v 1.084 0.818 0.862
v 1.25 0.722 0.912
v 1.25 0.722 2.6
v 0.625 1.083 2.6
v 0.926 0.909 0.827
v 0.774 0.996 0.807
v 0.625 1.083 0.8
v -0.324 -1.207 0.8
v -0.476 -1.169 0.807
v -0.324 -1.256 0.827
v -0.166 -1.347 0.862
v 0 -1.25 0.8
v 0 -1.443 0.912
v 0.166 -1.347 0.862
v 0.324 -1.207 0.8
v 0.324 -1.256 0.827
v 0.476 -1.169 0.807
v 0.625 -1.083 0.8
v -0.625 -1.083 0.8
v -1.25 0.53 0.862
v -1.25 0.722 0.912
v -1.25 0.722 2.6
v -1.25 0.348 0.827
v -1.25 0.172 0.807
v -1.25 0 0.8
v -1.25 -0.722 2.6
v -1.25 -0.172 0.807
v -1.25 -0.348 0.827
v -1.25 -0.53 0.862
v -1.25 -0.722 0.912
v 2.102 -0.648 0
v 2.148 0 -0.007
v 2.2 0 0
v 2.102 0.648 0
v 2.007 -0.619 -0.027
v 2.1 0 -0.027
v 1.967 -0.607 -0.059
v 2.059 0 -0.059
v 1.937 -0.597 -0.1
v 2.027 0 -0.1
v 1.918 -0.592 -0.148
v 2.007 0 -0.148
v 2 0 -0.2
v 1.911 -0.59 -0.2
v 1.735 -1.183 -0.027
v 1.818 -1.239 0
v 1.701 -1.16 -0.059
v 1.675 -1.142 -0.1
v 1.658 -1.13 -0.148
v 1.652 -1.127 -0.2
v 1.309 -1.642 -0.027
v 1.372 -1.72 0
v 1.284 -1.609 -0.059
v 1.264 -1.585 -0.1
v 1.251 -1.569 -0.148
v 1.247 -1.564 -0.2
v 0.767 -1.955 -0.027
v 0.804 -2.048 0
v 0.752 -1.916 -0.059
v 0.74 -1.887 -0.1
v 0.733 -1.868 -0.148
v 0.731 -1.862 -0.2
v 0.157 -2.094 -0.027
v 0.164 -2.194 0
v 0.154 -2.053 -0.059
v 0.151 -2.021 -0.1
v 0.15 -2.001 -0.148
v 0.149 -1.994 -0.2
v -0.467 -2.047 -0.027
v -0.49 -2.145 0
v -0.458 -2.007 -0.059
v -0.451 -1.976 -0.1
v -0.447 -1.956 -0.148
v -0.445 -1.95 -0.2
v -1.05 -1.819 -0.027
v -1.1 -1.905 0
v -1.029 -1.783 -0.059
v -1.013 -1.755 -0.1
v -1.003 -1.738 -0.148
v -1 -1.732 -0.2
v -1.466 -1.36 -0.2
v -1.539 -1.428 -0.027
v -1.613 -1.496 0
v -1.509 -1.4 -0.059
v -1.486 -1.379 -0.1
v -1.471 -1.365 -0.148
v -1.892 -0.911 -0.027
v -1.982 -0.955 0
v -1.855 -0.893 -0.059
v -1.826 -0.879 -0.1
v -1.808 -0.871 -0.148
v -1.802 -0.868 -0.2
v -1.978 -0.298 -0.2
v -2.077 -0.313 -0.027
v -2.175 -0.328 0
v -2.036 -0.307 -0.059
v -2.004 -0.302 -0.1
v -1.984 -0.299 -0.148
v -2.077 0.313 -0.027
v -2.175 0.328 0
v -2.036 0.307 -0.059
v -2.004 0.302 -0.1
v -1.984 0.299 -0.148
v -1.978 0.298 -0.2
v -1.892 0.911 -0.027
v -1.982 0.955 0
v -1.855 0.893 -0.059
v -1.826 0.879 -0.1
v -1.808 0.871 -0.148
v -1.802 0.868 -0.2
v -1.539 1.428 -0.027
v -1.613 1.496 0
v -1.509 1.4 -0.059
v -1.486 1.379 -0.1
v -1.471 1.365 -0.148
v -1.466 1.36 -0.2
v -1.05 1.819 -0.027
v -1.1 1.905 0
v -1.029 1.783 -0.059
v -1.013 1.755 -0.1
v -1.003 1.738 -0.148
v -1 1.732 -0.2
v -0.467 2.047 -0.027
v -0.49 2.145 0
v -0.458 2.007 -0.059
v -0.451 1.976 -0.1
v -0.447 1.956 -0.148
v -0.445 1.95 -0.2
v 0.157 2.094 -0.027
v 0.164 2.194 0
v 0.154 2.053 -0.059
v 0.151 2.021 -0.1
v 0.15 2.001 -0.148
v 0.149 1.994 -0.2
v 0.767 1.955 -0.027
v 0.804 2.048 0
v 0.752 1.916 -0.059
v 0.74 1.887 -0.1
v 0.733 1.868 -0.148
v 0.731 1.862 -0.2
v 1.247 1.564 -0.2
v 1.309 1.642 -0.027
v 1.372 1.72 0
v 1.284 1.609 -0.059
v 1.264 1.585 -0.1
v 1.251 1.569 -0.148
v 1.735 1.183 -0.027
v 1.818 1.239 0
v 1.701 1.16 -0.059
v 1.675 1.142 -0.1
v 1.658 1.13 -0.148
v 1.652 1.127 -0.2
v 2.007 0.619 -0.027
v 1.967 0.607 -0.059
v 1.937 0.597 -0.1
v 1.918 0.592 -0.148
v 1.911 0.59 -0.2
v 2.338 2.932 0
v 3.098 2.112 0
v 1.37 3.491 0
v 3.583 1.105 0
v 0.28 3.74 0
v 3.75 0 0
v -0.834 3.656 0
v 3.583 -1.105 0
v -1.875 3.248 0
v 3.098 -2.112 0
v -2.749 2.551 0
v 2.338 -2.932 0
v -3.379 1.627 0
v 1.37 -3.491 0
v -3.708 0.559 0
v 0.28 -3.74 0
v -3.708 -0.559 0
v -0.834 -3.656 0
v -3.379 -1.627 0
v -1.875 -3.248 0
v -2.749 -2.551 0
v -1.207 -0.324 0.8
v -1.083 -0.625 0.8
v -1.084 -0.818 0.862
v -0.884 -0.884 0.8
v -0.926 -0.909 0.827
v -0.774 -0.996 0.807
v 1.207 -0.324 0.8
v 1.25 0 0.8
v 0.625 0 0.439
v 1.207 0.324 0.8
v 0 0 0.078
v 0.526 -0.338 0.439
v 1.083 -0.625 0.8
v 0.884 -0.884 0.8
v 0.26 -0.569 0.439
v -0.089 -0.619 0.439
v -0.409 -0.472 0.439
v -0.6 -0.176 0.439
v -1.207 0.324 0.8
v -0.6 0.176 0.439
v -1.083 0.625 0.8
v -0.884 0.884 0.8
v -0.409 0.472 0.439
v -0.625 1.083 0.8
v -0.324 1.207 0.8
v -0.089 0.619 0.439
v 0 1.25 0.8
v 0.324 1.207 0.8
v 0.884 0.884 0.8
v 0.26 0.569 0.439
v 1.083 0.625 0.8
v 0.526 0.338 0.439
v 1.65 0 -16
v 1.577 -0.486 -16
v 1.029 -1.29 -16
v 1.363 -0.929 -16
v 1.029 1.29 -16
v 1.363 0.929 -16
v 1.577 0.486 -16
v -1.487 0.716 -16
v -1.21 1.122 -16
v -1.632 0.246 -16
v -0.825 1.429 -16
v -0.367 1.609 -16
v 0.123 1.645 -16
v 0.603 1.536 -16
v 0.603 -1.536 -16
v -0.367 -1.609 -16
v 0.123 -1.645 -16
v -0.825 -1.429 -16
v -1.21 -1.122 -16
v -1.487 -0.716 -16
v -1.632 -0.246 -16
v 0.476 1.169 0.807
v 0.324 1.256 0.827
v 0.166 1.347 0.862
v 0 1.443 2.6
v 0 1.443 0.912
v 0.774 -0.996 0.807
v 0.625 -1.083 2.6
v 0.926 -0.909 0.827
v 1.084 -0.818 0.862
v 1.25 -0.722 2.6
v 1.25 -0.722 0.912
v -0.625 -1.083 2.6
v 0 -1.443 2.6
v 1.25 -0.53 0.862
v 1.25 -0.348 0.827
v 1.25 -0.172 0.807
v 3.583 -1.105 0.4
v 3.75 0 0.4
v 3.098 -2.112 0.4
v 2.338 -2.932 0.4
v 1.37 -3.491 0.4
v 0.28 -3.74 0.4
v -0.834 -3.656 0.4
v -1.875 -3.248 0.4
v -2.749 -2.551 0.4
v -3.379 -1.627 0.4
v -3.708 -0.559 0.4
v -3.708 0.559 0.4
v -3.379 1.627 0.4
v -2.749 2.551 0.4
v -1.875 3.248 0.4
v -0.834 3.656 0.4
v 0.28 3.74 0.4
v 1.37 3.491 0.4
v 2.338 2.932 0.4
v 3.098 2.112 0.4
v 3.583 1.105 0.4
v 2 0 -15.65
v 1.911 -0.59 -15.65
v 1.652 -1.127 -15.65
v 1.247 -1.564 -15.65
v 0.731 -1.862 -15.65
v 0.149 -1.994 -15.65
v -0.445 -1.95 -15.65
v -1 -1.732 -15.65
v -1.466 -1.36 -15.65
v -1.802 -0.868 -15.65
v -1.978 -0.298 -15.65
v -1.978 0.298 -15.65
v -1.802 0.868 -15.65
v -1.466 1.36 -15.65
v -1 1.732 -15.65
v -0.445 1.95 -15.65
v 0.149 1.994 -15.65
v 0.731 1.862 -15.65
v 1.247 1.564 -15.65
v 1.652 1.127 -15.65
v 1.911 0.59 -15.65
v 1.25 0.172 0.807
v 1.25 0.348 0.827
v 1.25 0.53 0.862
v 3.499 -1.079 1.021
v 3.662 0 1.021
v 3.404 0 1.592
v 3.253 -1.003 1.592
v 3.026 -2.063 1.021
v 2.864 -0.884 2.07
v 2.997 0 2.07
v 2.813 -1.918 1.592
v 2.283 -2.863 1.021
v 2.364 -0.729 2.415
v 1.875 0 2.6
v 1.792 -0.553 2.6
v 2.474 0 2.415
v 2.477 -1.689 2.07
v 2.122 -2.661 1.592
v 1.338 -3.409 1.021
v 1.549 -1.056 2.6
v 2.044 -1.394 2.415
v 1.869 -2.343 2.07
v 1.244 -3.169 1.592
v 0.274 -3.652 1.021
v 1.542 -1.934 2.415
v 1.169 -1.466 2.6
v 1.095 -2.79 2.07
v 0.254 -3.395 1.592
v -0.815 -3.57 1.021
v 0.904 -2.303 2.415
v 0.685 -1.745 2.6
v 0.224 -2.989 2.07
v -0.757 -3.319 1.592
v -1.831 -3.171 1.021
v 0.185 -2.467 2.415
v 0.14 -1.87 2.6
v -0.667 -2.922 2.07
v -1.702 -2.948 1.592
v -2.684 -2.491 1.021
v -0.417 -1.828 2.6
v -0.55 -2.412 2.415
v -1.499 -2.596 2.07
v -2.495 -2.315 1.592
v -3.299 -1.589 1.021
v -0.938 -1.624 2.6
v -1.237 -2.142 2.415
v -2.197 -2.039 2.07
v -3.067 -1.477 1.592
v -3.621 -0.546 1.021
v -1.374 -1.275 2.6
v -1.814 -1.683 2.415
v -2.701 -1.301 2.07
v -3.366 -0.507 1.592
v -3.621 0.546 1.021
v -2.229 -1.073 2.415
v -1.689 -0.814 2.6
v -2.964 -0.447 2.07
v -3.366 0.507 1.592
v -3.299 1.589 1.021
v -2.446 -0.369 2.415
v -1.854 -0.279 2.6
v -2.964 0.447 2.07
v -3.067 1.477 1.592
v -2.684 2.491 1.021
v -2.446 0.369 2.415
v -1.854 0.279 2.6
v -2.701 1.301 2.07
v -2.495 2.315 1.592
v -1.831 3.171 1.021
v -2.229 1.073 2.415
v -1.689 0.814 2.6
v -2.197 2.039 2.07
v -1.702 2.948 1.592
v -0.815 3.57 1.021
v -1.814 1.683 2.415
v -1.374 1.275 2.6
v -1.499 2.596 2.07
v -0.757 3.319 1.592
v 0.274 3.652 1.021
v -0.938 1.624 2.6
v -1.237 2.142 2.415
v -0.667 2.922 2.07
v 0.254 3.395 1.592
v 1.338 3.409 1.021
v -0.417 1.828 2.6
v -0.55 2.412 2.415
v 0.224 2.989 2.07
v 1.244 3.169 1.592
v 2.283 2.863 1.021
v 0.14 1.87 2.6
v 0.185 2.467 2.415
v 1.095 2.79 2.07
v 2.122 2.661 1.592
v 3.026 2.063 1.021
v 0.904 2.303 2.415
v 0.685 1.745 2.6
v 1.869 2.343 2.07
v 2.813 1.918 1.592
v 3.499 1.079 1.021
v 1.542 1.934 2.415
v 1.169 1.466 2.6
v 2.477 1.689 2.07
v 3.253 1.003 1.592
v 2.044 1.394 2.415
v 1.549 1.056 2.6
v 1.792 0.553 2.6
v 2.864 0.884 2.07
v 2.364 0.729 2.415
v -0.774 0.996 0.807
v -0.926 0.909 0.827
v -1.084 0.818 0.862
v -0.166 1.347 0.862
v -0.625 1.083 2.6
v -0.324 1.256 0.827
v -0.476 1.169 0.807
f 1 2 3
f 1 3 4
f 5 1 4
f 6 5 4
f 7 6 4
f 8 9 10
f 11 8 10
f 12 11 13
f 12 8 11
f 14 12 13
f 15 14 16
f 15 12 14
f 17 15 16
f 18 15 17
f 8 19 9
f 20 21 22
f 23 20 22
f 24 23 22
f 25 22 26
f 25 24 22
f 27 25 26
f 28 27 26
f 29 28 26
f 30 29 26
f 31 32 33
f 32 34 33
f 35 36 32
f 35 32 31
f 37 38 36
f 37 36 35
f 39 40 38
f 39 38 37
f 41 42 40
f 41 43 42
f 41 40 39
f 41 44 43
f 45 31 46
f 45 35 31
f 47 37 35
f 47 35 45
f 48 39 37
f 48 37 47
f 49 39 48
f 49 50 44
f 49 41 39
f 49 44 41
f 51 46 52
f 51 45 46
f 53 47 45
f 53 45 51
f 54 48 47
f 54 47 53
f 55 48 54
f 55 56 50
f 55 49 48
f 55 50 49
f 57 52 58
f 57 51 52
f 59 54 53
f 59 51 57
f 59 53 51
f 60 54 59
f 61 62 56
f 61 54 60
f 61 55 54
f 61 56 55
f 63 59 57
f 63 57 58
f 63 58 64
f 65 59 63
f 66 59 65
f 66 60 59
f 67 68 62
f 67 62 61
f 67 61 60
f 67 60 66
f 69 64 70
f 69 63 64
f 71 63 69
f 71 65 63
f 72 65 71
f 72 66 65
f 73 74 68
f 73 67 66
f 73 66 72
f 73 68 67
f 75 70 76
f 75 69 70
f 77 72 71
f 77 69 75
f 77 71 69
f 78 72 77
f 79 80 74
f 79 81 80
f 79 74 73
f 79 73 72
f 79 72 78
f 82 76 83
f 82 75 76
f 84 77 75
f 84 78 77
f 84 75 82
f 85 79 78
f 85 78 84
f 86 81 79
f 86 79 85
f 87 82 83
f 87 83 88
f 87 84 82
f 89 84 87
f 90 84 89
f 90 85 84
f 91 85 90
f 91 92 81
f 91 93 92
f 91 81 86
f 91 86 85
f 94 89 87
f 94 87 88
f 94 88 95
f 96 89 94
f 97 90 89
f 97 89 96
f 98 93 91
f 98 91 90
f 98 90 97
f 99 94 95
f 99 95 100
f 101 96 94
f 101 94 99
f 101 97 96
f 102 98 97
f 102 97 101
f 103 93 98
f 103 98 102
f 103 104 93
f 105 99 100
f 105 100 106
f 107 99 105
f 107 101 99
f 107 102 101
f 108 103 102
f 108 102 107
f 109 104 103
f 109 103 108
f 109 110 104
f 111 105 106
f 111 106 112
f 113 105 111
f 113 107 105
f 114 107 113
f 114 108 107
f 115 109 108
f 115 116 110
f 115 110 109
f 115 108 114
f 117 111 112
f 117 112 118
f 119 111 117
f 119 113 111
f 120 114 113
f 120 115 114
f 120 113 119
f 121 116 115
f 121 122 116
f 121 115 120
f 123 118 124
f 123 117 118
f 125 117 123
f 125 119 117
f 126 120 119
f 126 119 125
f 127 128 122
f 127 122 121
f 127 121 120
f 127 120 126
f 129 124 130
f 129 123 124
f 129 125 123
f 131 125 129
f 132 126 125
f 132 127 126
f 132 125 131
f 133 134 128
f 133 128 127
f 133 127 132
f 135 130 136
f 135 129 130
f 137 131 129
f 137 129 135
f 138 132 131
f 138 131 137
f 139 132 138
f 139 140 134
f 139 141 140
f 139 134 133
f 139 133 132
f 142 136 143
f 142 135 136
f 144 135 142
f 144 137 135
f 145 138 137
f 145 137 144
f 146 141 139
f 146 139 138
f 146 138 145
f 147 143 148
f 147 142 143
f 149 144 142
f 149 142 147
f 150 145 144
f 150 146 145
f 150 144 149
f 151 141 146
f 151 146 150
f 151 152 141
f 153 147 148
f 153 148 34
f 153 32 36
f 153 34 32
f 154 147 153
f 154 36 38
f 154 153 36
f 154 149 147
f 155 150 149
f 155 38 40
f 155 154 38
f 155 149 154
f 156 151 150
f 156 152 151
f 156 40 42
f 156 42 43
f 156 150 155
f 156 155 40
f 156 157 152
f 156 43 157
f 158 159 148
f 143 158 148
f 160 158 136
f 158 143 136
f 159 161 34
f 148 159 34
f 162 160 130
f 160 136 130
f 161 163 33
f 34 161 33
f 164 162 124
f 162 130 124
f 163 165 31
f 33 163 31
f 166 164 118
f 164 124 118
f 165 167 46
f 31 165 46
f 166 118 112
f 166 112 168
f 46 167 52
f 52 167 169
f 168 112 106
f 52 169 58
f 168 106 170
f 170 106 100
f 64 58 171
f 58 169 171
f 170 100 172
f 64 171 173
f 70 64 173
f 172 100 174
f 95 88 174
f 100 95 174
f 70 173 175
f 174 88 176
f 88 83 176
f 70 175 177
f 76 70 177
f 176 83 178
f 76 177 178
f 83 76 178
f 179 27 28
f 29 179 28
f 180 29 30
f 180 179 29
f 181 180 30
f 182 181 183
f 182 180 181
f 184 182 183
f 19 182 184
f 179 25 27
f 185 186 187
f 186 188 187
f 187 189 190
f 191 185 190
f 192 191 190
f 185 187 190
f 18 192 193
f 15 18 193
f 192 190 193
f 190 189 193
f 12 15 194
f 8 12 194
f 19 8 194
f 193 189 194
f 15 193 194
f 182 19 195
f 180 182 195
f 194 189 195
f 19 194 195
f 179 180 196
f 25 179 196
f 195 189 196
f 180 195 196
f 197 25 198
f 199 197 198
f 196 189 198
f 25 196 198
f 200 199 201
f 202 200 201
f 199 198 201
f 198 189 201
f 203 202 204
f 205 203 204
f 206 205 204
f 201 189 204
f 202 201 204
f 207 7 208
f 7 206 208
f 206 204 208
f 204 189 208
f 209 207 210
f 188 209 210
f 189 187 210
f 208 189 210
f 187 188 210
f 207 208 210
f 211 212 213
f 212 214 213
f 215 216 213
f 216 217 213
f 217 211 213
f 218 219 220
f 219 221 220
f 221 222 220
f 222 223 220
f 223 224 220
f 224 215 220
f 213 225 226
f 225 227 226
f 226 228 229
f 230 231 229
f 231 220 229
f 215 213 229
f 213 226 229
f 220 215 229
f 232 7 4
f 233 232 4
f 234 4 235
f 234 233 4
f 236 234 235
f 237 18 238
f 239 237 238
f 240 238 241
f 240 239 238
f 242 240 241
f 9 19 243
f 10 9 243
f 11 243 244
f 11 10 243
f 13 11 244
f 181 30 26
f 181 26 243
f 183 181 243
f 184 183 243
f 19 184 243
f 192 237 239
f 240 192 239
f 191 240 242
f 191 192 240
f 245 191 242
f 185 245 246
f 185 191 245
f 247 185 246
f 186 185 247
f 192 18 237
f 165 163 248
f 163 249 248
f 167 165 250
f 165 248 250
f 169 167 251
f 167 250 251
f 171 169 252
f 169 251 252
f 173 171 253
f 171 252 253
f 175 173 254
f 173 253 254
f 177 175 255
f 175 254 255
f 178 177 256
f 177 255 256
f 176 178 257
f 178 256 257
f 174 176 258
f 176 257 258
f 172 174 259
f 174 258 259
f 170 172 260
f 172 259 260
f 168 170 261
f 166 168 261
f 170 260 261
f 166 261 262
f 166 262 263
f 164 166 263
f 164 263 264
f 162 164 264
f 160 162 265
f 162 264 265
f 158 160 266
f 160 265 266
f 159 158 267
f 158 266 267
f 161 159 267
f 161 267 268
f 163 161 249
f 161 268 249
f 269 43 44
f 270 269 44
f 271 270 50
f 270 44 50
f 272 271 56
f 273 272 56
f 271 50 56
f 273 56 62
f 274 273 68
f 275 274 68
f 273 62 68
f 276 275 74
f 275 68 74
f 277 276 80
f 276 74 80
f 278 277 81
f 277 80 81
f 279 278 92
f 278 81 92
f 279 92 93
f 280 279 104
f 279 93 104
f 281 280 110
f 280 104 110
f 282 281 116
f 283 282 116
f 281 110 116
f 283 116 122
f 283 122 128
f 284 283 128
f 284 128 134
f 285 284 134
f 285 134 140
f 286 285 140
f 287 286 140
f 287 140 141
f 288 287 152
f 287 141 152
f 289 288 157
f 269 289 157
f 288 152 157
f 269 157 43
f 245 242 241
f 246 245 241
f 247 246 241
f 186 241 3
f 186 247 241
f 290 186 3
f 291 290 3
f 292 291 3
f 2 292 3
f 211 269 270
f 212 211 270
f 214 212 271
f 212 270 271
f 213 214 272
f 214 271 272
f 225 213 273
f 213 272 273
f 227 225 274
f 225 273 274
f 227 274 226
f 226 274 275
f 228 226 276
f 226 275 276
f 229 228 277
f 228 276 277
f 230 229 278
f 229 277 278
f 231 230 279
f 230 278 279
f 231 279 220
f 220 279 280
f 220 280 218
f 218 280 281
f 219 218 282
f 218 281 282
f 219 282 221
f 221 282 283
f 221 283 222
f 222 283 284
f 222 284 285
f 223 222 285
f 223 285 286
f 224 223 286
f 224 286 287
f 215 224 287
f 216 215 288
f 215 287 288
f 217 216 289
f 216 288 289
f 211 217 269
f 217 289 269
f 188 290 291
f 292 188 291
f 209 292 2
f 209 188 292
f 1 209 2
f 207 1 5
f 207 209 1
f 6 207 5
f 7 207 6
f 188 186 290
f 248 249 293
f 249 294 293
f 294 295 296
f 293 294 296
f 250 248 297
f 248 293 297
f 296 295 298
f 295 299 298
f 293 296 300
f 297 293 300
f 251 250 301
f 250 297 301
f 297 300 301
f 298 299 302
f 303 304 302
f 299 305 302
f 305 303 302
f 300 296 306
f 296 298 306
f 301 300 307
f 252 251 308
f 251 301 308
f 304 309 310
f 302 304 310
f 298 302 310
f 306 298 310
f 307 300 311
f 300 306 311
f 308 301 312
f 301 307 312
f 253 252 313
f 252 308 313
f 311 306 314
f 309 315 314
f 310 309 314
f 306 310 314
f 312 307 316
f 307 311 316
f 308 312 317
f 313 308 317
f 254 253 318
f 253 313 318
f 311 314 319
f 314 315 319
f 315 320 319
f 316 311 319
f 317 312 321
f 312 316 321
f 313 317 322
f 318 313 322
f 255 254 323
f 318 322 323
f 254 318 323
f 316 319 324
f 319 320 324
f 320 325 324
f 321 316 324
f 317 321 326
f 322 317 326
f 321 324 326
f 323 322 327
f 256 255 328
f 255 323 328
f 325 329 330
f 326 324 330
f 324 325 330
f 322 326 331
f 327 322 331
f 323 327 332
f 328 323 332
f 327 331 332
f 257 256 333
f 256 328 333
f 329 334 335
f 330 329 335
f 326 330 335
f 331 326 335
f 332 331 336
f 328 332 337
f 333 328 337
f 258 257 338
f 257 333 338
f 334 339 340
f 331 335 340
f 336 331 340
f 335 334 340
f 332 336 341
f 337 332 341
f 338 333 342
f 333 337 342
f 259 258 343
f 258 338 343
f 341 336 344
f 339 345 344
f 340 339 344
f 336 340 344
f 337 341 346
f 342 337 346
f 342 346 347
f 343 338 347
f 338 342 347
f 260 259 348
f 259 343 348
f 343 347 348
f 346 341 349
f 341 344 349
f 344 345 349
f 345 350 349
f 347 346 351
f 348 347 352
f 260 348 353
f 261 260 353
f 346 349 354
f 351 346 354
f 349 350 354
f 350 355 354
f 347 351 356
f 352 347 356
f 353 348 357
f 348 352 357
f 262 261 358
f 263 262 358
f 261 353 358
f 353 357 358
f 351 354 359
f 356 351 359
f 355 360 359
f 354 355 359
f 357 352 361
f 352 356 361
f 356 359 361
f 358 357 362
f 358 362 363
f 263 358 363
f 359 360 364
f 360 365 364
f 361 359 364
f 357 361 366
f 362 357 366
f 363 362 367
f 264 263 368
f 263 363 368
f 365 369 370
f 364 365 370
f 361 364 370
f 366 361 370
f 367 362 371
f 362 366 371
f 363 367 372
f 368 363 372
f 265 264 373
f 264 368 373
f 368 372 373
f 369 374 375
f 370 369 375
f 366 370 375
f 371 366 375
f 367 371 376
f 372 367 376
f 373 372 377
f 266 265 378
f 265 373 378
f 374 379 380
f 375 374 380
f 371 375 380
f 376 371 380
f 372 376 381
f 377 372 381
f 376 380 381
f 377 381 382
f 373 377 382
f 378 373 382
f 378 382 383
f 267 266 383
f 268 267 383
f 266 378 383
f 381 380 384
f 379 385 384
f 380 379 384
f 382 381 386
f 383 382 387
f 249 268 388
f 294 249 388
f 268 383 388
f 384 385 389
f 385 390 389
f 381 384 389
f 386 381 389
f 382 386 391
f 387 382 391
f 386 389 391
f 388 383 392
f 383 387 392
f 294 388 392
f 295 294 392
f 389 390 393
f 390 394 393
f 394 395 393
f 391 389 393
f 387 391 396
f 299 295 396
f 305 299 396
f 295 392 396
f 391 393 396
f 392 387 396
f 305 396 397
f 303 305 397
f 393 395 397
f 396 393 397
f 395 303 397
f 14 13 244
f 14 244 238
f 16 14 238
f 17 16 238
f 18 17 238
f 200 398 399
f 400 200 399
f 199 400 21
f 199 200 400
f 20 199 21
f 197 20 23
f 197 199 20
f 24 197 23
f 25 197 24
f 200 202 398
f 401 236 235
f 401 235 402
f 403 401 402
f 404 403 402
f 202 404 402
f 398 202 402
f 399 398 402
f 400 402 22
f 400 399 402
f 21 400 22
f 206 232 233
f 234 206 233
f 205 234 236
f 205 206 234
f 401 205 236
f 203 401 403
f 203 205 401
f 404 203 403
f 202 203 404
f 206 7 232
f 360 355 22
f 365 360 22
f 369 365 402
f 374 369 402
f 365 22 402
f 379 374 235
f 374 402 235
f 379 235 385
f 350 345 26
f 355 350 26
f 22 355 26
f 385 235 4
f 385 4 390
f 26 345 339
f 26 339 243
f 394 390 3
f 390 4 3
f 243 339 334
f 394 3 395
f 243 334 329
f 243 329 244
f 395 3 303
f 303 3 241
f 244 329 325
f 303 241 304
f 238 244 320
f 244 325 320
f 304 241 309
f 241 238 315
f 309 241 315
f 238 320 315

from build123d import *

# Parameters (mm, degrees)
CHAMFER1_SIZE      = 0.35
CUT_EXTRUDE1_START = -1.8000001
CUT_EXTRUDE1_DEPTH = 2.8000001
FILLET1_R          = 0.2


with BuildPart() as part:
    # Sketch1 → Revolve1 (revolve)
    with BuildSketch(Plane(origin=(0, 0, 0), x_dir=(0, 0, -1), z_dir=(1, 0, 0)), mode=Mode.PRIVATE) as revolve1_sk:
        with BuildLine():
            Line((16, 0), (16, 2))
            Line((16, 2), (0, 2))
            Line((0, 2), (0, 3.75))
            Line((0, 3.75), (-0.4, 3.75))
            ThreePointArc((-0.4, 3.75), (-1.845304899, 3.217657748), (-2.6, 1.875))
            Line((-2.6, 1.875), (-2.6, 0))
            Line((-2.6, 0), (16, 0))
        make_face()
    revolve(revolve1_sk.sketch.rotate(Axis((0, 0, 30.809969789), (0, 0, -1)), 90), axis=Axis((0, 0, 30.809969789), (0, 0, -1)))

    # Chamfer1
    chamfer1_edges = [part.edges().sort_by_distance(p)[0] for p in [
        (-2, 0, -16),
    ]]
    chamfer(chamfer1_edges, length=CHAMFER1_SIZE)

    # Sketch2 → Cut-Revolve1 (revolve, cut)
    with BuildSketch(Plane(origin=(0, 0, 0), x_dir=(0, 0, -1), z_dir=(1, 0, 0)), mode=Mode.PRIVATE) as cut_revolve1_sk:
        Polygon((-2.6, 0), (-2.6, 1.25), (-0.8, 1.25), (-0.078312164, 0), align=None)
    revolve(cut_revolve1_sk.sketch.rotate(Axis((0, 0, 2.452500839), (0, 0, -1)), 90), axis=Axis((0, 0, 2.452500839), (0, 0, -1)), mode=Mode.SUBTRACT)

    # Cut-Extrude1: read off the stored shape, not the designer's step
    # Cut-Extrude1 outline → Cut-Extrude1 (cut)
    with BuildSketch(Plane.XY.offset(2.6).offset(CUT_EXTRUDE1_START)):
        with BuildLine():
            Line((1.25, 0), (1.25, 0.721687836))
            Line((1.25, 0.721687836), (0.625, 1.082531755))
            ThreePointArc((0.625, 1.082531755), (1.082531755, 0.625), (1.25, 0))
        make_face()
        with BuildLine():
            ThreePointArc((-0.625, 1.082531755), (0, 1.25), (0.625, 1.082531755))
            Line((0.625, 1.082531755), (0, 1.443375673))
            Line((0, 1.443375673), (-0.625, 1.082531755))
        make_face()
        with BuildLine():
            Line((1.25, -0.721687836), (1.25, 0))
            ThreePointArc((1.25, 0), (1.082531755, -0.625), (0.625, -1.082531755))
            Line((0.625, -1.082531755), (1.25, -0.721687836))
        make_face()
        with BuildLine():
            ThreePointArc((-1.25, 0), (-1.082531755, 0.625), (-0.625, 1.082531755))
            Line((-0.625, 1.082531755), (-1.25, 0.721687836))
            Line((-1.25, 0.721687836), (-1.25, 0))
        make_face()
        with BuildLine():
            Line((0, -1.443375673), (0.625, -1.082531755))
            ThreePointArc((0.625, -1.082531755), (0, -1.25), (-0.625, -1.082531755))
            Line((-0.625, -1.082531755), (0, -1.443375673))
        make_face()
        with BuildLine():
            ThreePointArc((-0.625, -1.082531755), (-1.082531755, -0.625), (-1.25, 0))
            Line((-1.25, 0), (-1.25, -0.721687836))
            Line((-1.25, -0.721687836), (-0.625, -1.082531755))
        make_face()
    extrude(amount=CUT_EXTRUDE1_DEPTH, mode=Mode.SUBTRACT)

    # Cut-Extrude1 2 outline → Cut-Extrude1 2 (revolve)
    with BuildSketch(Plane.XZ):
        Polygon((1.443375738, 0.911645534), (1.249999957, 0.799999975), (1.443375673, 0.7999999), align=None)
    revolve(axis=Axis((0, 0, 0), (0, 0, 1)))

    # Fillet1
    fillet1_edges = [part.edges().sort_by_distance(p)[0] for p in [
        (-2, 0, 0),
    ]]
    fillet(fillet1_edges, radius=FILLET1_R)


solid = part.part
